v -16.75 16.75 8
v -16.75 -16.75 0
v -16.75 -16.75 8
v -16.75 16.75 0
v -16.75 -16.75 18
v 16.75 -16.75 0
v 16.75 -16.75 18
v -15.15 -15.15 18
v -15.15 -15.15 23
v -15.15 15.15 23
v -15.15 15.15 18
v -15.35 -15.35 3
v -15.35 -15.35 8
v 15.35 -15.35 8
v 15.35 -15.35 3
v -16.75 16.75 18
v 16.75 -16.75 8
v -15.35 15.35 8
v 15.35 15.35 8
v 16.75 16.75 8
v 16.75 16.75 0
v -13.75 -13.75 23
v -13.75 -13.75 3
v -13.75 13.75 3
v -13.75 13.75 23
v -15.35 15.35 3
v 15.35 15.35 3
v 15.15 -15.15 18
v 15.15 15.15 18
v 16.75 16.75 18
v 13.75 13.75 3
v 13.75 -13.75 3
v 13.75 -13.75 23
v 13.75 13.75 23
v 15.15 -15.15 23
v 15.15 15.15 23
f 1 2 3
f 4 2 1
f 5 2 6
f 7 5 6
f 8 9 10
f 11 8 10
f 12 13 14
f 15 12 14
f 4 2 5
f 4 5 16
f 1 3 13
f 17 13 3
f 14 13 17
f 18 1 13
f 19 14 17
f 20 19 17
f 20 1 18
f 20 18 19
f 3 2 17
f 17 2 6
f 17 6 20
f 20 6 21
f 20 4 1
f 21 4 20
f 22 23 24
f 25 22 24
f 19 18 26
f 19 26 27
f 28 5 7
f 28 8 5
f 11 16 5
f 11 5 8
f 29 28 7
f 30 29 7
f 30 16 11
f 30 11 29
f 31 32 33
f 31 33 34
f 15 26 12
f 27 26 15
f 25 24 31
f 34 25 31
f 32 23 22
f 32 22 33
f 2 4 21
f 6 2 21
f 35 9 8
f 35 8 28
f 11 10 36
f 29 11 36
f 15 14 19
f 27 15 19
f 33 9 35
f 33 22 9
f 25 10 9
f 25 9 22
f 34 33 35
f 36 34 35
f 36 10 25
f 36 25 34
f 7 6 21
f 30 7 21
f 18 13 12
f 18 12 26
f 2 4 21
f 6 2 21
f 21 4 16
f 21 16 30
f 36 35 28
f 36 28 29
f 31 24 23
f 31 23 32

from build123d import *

# Parameters (mm, degrees)
SKETCH_W        = 33.5
SKETCH_H        = 33.5
PAD_DEPTH       = 23
BOX_W           = 27.5
BOX_H           = 27.5
BOX_DEPTH       = 20
SKETCH001_W     = 33.5
SKETCH001_H     = 33.5
SKETCH001_W_2   = 30.3
SKETCH001_H_2   = 30.3
POCKET_DEPTH    = 5
SKETCH002_W     = 33.5
SKETCH002_H     = 33.5
PAD001_DEPTH    = 8
SKETCH003_W     = 30.7
SKETCH003_H     = 30.7
POCKET001_DEPTH = 5


with BuildPart() as bottom:
    # Sketch → Pad (new body)
    with BuildSketch(Plane.XY):
        Rectangle(SKETCH_W, SKETCH_H)
    extrude(amount=PAD_DEPTH)

    # Box → Box (cut)
    with BuildSketch(Plane(origin=(-13.75, -13.75, 3), x_dir=(1, 0, 0), z_dir=(0, 0, 1))):
        with Locations((13.75, 13.75)):
            Rectangle(BOX_W, BOX_H)
    extrude(amount=BOX_DEPTH, mode=Mode.SUBTRACT)

    # Sketch001 → Pocket (cut)
    with BuildSketch(Plane.XY.offset(23)):
        Rectangle(SKETCH001_W, SKETCH001_H)
        Rectangle(SKETCH001_W_2, SKETCH001_H_2, mode=Mode.SUBTRACT)
    extrude(amount=-POCKET_DEPTH, mode=Mode.SUBTRACT)


with BuildPart() as cap:
    # Sketch002 → Pad001 (new body)
    with BuildSketch(Plane.XY):
        Rectangle(SKETCH002_W, SKETCH002_H)
    extrude(amount=PAD001_DEPTH)

    # Sketch003 → Pocket001 (cut)
    with BuildSketch(Plane.XY.offset(8)):
        Rectangle(SKETCH003_W, SKETCH003_H)
    extrude(amount=-POCKET001_DEPTH, mode=Mode.SUBTRACT)


solid = Compound([bottom.part, cap.part])
